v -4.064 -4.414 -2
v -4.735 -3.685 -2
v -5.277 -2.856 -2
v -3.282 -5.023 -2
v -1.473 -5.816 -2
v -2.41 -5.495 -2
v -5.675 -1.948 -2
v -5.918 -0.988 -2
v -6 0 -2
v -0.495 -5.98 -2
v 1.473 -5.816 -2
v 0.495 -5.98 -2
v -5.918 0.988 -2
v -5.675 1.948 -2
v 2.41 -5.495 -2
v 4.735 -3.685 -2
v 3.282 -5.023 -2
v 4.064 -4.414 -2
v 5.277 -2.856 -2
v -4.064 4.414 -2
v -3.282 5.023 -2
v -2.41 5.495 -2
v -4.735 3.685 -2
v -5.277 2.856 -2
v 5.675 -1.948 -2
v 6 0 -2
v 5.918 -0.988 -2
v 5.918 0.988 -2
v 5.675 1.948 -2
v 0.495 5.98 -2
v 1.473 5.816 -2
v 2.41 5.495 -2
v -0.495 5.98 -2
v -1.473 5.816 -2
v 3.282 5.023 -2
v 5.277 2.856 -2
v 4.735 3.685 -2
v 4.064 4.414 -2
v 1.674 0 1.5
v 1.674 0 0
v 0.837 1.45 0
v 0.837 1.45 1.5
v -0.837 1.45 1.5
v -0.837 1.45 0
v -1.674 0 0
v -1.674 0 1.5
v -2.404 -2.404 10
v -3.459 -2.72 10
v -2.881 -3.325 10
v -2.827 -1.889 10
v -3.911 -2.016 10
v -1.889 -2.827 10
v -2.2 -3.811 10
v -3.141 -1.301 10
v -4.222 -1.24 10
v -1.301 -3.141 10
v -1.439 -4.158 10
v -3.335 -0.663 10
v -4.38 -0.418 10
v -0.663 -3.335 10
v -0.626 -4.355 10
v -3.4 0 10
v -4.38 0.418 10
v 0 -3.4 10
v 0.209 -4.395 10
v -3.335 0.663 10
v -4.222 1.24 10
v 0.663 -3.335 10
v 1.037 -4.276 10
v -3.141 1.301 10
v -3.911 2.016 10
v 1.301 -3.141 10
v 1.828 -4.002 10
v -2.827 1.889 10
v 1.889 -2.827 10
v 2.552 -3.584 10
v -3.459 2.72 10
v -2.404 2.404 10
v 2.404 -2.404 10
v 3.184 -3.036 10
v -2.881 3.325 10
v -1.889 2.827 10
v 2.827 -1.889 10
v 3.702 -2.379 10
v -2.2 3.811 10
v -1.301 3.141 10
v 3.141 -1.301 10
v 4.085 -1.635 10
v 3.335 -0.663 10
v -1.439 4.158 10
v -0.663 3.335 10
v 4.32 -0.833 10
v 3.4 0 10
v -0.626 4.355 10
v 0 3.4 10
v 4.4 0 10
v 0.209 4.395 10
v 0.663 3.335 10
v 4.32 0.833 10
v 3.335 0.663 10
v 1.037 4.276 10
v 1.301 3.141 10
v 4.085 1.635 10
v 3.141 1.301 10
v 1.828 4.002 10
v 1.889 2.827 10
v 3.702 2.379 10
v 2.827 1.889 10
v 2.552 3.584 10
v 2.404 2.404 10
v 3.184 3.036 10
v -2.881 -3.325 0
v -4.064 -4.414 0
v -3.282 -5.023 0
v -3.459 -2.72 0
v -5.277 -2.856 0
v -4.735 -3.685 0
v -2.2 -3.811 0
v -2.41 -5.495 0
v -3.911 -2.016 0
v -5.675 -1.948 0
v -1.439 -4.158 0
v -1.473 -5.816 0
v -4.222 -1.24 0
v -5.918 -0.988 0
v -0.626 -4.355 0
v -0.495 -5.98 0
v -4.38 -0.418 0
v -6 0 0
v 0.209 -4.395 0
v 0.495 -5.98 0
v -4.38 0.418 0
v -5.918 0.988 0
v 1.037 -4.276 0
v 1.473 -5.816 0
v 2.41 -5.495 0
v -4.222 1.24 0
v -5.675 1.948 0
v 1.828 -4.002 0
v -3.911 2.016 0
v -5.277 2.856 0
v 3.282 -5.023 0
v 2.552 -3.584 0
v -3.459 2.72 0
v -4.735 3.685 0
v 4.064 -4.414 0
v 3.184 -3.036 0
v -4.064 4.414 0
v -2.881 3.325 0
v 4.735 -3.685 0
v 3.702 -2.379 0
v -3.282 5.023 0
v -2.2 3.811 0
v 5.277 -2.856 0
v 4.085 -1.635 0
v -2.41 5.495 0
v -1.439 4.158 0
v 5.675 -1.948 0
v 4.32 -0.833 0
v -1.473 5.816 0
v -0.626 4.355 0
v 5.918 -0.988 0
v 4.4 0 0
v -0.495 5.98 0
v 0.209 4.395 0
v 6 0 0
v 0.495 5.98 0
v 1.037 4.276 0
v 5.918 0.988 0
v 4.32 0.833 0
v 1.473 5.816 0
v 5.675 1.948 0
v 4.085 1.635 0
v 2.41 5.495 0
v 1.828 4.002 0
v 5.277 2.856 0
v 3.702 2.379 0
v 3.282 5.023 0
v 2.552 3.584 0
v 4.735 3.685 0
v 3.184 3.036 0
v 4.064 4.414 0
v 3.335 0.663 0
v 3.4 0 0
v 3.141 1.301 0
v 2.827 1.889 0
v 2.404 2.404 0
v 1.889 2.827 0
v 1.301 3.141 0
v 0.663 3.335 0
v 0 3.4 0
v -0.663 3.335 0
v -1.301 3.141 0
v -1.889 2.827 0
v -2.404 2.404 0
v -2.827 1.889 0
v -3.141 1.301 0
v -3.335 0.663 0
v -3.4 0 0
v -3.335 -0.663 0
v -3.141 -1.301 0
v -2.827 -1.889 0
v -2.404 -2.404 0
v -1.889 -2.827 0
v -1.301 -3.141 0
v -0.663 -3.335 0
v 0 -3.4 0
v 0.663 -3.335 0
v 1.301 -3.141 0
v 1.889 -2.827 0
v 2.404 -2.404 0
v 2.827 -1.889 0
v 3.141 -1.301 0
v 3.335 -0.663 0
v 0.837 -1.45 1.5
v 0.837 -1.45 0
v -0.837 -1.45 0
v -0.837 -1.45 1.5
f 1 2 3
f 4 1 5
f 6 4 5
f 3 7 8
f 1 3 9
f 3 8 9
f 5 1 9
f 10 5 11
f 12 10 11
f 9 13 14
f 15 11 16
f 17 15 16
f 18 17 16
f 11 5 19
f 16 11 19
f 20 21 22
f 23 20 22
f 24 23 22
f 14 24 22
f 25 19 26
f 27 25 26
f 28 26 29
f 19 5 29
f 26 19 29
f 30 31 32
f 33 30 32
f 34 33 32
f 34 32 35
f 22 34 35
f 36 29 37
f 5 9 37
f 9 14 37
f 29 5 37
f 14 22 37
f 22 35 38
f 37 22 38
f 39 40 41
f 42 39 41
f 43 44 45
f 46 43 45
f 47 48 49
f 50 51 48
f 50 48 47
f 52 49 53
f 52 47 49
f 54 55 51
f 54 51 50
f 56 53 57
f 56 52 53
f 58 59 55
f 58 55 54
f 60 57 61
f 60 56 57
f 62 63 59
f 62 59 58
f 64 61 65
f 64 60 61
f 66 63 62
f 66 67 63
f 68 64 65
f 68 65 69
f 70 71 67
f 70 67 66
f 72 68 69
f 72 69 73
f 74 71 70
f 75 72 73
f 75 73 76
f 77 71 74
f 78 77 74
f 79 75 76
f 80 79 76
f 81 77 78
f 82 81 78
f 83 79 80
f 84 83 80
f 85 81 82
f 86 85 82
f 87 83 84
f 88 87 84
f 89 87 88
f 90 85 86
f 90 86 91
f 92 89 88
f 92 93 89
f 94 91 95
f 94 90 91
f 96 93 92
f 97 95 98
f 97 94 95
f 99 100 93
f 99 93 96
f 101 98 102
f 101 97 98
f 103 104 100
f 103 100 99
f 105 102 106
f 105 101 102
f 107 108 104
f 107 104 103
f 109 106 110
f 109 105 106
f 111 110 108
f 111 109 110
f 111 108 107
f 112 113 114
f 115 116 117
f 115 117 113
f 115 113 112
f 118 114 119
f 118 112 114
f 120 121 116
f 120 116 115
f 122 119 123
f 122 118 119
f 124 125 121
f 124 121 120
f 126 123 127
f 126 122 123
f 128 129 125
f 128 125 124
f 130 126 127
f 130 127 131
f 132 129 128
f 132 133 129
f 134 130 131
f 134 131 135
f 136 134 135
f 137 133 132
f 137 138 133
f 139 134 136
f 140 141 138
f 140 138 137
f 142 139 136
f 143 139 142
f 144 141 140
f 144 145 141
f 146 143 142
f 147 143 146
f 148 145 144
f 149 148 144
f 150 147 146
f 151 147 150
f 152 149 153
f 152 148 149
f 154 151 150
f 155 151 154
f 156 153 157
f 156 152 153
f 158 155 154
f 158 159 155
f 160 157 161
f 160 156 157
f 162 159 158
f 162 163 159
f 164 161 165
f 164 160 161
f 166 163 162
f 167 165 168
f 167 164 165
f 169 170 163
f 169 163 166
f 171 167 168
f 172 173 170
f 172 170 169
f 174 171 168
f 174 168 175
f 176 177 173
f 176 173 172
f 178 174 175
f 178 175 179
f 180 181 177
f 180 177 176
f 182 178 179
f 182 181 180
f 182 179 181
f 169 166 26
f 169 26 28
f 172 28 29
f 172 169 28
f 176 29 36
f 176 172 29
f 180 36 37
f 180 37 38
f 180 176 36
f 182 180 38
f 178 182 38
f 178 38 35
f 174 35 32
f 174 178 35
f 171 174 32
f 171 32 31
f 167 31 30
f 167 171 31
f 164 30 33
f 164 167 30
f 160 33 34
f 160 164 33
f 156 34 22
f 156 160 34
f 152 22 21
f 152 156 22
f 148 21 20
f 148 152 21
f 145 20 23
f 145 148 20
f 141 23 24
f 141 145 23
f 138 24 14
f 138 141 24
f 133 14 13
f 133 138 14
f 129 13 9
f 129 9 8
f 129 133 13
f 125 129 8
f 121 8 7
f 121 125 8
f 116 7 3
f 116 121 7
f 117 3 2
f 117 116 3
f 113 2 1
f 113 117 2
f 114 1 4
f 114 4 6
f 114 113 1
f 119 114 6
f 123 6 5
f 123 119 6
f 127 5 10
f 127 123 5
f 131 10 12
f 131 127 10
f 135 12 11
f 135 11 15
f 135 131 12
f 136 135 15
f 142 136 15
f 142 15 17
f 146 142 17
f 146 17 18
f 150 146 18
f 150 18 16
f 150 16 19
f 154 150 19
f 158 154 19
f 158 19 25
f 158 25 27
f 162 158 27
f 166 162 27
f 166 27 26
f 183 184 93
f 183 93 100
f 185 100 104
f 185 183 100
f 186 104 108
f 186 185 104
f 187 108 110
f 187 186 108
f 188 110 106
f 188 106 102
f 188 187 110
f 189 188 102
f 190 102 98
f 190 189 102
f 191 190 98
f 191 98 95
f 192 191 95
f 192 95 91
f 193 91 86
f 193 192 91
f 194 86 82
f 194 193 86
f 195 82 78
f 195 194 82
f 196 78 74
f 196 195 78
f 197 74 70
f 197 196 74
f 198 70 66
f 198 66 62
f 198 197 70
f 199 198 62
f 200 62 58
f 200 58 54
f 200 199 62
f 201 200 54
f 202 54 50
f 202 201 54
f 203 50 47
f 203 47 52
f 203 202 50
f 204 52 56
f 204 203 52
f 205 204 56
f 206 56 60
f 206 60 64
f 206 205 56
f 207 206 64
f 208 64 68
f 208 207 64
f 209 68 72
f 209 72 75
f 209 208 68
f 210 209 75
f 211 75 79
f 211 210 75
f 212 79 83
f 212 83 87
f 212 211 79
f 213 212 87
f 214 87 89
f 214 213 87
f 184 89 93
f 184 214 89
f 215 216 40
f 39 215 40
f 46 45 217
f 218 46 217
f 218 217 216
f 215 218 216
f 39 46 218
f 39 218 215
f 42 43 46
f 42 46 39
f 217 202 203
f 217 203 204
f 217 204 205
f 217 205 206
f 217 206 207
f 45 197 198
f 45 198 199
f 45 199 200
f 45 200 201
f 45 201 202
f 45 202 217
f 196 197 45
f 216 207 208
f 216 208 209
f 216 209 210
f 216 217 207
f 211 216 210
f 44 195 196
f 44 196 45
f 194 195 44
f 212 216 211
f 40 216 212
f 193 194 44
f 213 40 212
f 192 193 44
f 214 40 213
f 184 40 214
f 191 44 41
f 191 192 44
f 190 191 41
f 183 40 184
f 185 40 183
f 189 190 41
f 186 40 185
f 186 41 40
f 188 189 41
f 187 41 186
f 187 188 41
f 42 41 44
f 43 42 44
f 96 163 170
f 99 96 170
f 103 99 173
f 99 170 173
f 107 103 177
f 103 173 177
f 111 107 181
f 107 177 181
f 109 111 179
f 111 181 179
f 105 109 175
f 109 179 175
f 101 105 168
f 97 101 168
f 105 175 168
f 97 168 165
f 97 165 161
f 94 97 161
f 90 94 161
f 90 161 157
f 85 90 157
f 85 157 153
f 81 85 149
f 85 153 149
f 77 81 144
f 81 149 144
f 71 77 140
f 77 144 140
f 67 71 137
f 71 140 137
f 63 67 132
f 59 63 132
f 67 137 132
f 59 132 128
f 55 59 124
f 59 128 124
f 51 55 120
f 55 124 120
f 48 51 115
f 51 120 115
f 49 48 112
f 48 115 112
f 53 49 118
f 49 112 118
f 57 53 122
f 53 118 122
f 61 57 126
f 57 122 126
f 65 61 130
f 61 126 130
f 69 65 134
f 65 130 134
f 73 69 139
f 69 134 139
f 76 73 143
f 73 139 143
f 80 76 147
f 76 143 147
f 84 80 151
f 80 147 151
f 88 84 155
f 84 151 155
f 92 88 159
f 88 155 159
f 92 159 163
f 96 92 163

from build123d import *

# Parameters (mm, degrees)
F0_R     = 6
F0_R_2   = 4.4
F0_R_3   = 3.4
F1_DEPTH = 2
F2_DEPTH = 10
F3_DEPTH = 1.5
F4_DEPTH = 2


with BuildPart() as f1:
    # F0 (on Top) → F1 (new body)
    with BuildSketch(Plane.XY):
        Circle(F0_R)
        Circle(F0_R_2, mode=Mode.SUBTRACT)
        Circle(F0_R_2)
        Circle(F0_R_3, mode=Mode.SUBTRACT)
        Circle(F0_R_3)
        Polygon((0.8371578903, 1.45), (1.6743157806, 0), (0.8371578903, -1.45), (-0.8371578903, -1.45), (-1.6743157806, 0), (-0.8371578903, 1.45), align=None, mode=Mode.SUBTRACT)
    extrude(amount=-F1_DEPTH)

    # F0 (on Top) → F2 (join)
    with BuildSketch(Plane.XY):
        Circle(F0_R_2)
        Circle(F0_R_3, mode=Mode.SUBTRACT)
    extrude(amount=F2_DEPTH)

    # F0 (on Top) → F3 (join)
    with BuildSketch(Plane.XY):
        Polygon((0.8371578903, -1.45), (1.6743157806, 0), (0.8371578903, 1.45), (-0.8371578903, 1.45), (-1.6743157806, 0), (-0.8371578903, -1.45), align=None)
    extrude(amount=F3_DEPTH)

    # F4 (add): a face of the model
    f4_faces = [f1.faces().sort_by_distance(p)[0] for p in [
        (0, 0, 0),
    ]]
    extrude(f4_faces, amount=F4_DEPTH)


solid = f1.part
